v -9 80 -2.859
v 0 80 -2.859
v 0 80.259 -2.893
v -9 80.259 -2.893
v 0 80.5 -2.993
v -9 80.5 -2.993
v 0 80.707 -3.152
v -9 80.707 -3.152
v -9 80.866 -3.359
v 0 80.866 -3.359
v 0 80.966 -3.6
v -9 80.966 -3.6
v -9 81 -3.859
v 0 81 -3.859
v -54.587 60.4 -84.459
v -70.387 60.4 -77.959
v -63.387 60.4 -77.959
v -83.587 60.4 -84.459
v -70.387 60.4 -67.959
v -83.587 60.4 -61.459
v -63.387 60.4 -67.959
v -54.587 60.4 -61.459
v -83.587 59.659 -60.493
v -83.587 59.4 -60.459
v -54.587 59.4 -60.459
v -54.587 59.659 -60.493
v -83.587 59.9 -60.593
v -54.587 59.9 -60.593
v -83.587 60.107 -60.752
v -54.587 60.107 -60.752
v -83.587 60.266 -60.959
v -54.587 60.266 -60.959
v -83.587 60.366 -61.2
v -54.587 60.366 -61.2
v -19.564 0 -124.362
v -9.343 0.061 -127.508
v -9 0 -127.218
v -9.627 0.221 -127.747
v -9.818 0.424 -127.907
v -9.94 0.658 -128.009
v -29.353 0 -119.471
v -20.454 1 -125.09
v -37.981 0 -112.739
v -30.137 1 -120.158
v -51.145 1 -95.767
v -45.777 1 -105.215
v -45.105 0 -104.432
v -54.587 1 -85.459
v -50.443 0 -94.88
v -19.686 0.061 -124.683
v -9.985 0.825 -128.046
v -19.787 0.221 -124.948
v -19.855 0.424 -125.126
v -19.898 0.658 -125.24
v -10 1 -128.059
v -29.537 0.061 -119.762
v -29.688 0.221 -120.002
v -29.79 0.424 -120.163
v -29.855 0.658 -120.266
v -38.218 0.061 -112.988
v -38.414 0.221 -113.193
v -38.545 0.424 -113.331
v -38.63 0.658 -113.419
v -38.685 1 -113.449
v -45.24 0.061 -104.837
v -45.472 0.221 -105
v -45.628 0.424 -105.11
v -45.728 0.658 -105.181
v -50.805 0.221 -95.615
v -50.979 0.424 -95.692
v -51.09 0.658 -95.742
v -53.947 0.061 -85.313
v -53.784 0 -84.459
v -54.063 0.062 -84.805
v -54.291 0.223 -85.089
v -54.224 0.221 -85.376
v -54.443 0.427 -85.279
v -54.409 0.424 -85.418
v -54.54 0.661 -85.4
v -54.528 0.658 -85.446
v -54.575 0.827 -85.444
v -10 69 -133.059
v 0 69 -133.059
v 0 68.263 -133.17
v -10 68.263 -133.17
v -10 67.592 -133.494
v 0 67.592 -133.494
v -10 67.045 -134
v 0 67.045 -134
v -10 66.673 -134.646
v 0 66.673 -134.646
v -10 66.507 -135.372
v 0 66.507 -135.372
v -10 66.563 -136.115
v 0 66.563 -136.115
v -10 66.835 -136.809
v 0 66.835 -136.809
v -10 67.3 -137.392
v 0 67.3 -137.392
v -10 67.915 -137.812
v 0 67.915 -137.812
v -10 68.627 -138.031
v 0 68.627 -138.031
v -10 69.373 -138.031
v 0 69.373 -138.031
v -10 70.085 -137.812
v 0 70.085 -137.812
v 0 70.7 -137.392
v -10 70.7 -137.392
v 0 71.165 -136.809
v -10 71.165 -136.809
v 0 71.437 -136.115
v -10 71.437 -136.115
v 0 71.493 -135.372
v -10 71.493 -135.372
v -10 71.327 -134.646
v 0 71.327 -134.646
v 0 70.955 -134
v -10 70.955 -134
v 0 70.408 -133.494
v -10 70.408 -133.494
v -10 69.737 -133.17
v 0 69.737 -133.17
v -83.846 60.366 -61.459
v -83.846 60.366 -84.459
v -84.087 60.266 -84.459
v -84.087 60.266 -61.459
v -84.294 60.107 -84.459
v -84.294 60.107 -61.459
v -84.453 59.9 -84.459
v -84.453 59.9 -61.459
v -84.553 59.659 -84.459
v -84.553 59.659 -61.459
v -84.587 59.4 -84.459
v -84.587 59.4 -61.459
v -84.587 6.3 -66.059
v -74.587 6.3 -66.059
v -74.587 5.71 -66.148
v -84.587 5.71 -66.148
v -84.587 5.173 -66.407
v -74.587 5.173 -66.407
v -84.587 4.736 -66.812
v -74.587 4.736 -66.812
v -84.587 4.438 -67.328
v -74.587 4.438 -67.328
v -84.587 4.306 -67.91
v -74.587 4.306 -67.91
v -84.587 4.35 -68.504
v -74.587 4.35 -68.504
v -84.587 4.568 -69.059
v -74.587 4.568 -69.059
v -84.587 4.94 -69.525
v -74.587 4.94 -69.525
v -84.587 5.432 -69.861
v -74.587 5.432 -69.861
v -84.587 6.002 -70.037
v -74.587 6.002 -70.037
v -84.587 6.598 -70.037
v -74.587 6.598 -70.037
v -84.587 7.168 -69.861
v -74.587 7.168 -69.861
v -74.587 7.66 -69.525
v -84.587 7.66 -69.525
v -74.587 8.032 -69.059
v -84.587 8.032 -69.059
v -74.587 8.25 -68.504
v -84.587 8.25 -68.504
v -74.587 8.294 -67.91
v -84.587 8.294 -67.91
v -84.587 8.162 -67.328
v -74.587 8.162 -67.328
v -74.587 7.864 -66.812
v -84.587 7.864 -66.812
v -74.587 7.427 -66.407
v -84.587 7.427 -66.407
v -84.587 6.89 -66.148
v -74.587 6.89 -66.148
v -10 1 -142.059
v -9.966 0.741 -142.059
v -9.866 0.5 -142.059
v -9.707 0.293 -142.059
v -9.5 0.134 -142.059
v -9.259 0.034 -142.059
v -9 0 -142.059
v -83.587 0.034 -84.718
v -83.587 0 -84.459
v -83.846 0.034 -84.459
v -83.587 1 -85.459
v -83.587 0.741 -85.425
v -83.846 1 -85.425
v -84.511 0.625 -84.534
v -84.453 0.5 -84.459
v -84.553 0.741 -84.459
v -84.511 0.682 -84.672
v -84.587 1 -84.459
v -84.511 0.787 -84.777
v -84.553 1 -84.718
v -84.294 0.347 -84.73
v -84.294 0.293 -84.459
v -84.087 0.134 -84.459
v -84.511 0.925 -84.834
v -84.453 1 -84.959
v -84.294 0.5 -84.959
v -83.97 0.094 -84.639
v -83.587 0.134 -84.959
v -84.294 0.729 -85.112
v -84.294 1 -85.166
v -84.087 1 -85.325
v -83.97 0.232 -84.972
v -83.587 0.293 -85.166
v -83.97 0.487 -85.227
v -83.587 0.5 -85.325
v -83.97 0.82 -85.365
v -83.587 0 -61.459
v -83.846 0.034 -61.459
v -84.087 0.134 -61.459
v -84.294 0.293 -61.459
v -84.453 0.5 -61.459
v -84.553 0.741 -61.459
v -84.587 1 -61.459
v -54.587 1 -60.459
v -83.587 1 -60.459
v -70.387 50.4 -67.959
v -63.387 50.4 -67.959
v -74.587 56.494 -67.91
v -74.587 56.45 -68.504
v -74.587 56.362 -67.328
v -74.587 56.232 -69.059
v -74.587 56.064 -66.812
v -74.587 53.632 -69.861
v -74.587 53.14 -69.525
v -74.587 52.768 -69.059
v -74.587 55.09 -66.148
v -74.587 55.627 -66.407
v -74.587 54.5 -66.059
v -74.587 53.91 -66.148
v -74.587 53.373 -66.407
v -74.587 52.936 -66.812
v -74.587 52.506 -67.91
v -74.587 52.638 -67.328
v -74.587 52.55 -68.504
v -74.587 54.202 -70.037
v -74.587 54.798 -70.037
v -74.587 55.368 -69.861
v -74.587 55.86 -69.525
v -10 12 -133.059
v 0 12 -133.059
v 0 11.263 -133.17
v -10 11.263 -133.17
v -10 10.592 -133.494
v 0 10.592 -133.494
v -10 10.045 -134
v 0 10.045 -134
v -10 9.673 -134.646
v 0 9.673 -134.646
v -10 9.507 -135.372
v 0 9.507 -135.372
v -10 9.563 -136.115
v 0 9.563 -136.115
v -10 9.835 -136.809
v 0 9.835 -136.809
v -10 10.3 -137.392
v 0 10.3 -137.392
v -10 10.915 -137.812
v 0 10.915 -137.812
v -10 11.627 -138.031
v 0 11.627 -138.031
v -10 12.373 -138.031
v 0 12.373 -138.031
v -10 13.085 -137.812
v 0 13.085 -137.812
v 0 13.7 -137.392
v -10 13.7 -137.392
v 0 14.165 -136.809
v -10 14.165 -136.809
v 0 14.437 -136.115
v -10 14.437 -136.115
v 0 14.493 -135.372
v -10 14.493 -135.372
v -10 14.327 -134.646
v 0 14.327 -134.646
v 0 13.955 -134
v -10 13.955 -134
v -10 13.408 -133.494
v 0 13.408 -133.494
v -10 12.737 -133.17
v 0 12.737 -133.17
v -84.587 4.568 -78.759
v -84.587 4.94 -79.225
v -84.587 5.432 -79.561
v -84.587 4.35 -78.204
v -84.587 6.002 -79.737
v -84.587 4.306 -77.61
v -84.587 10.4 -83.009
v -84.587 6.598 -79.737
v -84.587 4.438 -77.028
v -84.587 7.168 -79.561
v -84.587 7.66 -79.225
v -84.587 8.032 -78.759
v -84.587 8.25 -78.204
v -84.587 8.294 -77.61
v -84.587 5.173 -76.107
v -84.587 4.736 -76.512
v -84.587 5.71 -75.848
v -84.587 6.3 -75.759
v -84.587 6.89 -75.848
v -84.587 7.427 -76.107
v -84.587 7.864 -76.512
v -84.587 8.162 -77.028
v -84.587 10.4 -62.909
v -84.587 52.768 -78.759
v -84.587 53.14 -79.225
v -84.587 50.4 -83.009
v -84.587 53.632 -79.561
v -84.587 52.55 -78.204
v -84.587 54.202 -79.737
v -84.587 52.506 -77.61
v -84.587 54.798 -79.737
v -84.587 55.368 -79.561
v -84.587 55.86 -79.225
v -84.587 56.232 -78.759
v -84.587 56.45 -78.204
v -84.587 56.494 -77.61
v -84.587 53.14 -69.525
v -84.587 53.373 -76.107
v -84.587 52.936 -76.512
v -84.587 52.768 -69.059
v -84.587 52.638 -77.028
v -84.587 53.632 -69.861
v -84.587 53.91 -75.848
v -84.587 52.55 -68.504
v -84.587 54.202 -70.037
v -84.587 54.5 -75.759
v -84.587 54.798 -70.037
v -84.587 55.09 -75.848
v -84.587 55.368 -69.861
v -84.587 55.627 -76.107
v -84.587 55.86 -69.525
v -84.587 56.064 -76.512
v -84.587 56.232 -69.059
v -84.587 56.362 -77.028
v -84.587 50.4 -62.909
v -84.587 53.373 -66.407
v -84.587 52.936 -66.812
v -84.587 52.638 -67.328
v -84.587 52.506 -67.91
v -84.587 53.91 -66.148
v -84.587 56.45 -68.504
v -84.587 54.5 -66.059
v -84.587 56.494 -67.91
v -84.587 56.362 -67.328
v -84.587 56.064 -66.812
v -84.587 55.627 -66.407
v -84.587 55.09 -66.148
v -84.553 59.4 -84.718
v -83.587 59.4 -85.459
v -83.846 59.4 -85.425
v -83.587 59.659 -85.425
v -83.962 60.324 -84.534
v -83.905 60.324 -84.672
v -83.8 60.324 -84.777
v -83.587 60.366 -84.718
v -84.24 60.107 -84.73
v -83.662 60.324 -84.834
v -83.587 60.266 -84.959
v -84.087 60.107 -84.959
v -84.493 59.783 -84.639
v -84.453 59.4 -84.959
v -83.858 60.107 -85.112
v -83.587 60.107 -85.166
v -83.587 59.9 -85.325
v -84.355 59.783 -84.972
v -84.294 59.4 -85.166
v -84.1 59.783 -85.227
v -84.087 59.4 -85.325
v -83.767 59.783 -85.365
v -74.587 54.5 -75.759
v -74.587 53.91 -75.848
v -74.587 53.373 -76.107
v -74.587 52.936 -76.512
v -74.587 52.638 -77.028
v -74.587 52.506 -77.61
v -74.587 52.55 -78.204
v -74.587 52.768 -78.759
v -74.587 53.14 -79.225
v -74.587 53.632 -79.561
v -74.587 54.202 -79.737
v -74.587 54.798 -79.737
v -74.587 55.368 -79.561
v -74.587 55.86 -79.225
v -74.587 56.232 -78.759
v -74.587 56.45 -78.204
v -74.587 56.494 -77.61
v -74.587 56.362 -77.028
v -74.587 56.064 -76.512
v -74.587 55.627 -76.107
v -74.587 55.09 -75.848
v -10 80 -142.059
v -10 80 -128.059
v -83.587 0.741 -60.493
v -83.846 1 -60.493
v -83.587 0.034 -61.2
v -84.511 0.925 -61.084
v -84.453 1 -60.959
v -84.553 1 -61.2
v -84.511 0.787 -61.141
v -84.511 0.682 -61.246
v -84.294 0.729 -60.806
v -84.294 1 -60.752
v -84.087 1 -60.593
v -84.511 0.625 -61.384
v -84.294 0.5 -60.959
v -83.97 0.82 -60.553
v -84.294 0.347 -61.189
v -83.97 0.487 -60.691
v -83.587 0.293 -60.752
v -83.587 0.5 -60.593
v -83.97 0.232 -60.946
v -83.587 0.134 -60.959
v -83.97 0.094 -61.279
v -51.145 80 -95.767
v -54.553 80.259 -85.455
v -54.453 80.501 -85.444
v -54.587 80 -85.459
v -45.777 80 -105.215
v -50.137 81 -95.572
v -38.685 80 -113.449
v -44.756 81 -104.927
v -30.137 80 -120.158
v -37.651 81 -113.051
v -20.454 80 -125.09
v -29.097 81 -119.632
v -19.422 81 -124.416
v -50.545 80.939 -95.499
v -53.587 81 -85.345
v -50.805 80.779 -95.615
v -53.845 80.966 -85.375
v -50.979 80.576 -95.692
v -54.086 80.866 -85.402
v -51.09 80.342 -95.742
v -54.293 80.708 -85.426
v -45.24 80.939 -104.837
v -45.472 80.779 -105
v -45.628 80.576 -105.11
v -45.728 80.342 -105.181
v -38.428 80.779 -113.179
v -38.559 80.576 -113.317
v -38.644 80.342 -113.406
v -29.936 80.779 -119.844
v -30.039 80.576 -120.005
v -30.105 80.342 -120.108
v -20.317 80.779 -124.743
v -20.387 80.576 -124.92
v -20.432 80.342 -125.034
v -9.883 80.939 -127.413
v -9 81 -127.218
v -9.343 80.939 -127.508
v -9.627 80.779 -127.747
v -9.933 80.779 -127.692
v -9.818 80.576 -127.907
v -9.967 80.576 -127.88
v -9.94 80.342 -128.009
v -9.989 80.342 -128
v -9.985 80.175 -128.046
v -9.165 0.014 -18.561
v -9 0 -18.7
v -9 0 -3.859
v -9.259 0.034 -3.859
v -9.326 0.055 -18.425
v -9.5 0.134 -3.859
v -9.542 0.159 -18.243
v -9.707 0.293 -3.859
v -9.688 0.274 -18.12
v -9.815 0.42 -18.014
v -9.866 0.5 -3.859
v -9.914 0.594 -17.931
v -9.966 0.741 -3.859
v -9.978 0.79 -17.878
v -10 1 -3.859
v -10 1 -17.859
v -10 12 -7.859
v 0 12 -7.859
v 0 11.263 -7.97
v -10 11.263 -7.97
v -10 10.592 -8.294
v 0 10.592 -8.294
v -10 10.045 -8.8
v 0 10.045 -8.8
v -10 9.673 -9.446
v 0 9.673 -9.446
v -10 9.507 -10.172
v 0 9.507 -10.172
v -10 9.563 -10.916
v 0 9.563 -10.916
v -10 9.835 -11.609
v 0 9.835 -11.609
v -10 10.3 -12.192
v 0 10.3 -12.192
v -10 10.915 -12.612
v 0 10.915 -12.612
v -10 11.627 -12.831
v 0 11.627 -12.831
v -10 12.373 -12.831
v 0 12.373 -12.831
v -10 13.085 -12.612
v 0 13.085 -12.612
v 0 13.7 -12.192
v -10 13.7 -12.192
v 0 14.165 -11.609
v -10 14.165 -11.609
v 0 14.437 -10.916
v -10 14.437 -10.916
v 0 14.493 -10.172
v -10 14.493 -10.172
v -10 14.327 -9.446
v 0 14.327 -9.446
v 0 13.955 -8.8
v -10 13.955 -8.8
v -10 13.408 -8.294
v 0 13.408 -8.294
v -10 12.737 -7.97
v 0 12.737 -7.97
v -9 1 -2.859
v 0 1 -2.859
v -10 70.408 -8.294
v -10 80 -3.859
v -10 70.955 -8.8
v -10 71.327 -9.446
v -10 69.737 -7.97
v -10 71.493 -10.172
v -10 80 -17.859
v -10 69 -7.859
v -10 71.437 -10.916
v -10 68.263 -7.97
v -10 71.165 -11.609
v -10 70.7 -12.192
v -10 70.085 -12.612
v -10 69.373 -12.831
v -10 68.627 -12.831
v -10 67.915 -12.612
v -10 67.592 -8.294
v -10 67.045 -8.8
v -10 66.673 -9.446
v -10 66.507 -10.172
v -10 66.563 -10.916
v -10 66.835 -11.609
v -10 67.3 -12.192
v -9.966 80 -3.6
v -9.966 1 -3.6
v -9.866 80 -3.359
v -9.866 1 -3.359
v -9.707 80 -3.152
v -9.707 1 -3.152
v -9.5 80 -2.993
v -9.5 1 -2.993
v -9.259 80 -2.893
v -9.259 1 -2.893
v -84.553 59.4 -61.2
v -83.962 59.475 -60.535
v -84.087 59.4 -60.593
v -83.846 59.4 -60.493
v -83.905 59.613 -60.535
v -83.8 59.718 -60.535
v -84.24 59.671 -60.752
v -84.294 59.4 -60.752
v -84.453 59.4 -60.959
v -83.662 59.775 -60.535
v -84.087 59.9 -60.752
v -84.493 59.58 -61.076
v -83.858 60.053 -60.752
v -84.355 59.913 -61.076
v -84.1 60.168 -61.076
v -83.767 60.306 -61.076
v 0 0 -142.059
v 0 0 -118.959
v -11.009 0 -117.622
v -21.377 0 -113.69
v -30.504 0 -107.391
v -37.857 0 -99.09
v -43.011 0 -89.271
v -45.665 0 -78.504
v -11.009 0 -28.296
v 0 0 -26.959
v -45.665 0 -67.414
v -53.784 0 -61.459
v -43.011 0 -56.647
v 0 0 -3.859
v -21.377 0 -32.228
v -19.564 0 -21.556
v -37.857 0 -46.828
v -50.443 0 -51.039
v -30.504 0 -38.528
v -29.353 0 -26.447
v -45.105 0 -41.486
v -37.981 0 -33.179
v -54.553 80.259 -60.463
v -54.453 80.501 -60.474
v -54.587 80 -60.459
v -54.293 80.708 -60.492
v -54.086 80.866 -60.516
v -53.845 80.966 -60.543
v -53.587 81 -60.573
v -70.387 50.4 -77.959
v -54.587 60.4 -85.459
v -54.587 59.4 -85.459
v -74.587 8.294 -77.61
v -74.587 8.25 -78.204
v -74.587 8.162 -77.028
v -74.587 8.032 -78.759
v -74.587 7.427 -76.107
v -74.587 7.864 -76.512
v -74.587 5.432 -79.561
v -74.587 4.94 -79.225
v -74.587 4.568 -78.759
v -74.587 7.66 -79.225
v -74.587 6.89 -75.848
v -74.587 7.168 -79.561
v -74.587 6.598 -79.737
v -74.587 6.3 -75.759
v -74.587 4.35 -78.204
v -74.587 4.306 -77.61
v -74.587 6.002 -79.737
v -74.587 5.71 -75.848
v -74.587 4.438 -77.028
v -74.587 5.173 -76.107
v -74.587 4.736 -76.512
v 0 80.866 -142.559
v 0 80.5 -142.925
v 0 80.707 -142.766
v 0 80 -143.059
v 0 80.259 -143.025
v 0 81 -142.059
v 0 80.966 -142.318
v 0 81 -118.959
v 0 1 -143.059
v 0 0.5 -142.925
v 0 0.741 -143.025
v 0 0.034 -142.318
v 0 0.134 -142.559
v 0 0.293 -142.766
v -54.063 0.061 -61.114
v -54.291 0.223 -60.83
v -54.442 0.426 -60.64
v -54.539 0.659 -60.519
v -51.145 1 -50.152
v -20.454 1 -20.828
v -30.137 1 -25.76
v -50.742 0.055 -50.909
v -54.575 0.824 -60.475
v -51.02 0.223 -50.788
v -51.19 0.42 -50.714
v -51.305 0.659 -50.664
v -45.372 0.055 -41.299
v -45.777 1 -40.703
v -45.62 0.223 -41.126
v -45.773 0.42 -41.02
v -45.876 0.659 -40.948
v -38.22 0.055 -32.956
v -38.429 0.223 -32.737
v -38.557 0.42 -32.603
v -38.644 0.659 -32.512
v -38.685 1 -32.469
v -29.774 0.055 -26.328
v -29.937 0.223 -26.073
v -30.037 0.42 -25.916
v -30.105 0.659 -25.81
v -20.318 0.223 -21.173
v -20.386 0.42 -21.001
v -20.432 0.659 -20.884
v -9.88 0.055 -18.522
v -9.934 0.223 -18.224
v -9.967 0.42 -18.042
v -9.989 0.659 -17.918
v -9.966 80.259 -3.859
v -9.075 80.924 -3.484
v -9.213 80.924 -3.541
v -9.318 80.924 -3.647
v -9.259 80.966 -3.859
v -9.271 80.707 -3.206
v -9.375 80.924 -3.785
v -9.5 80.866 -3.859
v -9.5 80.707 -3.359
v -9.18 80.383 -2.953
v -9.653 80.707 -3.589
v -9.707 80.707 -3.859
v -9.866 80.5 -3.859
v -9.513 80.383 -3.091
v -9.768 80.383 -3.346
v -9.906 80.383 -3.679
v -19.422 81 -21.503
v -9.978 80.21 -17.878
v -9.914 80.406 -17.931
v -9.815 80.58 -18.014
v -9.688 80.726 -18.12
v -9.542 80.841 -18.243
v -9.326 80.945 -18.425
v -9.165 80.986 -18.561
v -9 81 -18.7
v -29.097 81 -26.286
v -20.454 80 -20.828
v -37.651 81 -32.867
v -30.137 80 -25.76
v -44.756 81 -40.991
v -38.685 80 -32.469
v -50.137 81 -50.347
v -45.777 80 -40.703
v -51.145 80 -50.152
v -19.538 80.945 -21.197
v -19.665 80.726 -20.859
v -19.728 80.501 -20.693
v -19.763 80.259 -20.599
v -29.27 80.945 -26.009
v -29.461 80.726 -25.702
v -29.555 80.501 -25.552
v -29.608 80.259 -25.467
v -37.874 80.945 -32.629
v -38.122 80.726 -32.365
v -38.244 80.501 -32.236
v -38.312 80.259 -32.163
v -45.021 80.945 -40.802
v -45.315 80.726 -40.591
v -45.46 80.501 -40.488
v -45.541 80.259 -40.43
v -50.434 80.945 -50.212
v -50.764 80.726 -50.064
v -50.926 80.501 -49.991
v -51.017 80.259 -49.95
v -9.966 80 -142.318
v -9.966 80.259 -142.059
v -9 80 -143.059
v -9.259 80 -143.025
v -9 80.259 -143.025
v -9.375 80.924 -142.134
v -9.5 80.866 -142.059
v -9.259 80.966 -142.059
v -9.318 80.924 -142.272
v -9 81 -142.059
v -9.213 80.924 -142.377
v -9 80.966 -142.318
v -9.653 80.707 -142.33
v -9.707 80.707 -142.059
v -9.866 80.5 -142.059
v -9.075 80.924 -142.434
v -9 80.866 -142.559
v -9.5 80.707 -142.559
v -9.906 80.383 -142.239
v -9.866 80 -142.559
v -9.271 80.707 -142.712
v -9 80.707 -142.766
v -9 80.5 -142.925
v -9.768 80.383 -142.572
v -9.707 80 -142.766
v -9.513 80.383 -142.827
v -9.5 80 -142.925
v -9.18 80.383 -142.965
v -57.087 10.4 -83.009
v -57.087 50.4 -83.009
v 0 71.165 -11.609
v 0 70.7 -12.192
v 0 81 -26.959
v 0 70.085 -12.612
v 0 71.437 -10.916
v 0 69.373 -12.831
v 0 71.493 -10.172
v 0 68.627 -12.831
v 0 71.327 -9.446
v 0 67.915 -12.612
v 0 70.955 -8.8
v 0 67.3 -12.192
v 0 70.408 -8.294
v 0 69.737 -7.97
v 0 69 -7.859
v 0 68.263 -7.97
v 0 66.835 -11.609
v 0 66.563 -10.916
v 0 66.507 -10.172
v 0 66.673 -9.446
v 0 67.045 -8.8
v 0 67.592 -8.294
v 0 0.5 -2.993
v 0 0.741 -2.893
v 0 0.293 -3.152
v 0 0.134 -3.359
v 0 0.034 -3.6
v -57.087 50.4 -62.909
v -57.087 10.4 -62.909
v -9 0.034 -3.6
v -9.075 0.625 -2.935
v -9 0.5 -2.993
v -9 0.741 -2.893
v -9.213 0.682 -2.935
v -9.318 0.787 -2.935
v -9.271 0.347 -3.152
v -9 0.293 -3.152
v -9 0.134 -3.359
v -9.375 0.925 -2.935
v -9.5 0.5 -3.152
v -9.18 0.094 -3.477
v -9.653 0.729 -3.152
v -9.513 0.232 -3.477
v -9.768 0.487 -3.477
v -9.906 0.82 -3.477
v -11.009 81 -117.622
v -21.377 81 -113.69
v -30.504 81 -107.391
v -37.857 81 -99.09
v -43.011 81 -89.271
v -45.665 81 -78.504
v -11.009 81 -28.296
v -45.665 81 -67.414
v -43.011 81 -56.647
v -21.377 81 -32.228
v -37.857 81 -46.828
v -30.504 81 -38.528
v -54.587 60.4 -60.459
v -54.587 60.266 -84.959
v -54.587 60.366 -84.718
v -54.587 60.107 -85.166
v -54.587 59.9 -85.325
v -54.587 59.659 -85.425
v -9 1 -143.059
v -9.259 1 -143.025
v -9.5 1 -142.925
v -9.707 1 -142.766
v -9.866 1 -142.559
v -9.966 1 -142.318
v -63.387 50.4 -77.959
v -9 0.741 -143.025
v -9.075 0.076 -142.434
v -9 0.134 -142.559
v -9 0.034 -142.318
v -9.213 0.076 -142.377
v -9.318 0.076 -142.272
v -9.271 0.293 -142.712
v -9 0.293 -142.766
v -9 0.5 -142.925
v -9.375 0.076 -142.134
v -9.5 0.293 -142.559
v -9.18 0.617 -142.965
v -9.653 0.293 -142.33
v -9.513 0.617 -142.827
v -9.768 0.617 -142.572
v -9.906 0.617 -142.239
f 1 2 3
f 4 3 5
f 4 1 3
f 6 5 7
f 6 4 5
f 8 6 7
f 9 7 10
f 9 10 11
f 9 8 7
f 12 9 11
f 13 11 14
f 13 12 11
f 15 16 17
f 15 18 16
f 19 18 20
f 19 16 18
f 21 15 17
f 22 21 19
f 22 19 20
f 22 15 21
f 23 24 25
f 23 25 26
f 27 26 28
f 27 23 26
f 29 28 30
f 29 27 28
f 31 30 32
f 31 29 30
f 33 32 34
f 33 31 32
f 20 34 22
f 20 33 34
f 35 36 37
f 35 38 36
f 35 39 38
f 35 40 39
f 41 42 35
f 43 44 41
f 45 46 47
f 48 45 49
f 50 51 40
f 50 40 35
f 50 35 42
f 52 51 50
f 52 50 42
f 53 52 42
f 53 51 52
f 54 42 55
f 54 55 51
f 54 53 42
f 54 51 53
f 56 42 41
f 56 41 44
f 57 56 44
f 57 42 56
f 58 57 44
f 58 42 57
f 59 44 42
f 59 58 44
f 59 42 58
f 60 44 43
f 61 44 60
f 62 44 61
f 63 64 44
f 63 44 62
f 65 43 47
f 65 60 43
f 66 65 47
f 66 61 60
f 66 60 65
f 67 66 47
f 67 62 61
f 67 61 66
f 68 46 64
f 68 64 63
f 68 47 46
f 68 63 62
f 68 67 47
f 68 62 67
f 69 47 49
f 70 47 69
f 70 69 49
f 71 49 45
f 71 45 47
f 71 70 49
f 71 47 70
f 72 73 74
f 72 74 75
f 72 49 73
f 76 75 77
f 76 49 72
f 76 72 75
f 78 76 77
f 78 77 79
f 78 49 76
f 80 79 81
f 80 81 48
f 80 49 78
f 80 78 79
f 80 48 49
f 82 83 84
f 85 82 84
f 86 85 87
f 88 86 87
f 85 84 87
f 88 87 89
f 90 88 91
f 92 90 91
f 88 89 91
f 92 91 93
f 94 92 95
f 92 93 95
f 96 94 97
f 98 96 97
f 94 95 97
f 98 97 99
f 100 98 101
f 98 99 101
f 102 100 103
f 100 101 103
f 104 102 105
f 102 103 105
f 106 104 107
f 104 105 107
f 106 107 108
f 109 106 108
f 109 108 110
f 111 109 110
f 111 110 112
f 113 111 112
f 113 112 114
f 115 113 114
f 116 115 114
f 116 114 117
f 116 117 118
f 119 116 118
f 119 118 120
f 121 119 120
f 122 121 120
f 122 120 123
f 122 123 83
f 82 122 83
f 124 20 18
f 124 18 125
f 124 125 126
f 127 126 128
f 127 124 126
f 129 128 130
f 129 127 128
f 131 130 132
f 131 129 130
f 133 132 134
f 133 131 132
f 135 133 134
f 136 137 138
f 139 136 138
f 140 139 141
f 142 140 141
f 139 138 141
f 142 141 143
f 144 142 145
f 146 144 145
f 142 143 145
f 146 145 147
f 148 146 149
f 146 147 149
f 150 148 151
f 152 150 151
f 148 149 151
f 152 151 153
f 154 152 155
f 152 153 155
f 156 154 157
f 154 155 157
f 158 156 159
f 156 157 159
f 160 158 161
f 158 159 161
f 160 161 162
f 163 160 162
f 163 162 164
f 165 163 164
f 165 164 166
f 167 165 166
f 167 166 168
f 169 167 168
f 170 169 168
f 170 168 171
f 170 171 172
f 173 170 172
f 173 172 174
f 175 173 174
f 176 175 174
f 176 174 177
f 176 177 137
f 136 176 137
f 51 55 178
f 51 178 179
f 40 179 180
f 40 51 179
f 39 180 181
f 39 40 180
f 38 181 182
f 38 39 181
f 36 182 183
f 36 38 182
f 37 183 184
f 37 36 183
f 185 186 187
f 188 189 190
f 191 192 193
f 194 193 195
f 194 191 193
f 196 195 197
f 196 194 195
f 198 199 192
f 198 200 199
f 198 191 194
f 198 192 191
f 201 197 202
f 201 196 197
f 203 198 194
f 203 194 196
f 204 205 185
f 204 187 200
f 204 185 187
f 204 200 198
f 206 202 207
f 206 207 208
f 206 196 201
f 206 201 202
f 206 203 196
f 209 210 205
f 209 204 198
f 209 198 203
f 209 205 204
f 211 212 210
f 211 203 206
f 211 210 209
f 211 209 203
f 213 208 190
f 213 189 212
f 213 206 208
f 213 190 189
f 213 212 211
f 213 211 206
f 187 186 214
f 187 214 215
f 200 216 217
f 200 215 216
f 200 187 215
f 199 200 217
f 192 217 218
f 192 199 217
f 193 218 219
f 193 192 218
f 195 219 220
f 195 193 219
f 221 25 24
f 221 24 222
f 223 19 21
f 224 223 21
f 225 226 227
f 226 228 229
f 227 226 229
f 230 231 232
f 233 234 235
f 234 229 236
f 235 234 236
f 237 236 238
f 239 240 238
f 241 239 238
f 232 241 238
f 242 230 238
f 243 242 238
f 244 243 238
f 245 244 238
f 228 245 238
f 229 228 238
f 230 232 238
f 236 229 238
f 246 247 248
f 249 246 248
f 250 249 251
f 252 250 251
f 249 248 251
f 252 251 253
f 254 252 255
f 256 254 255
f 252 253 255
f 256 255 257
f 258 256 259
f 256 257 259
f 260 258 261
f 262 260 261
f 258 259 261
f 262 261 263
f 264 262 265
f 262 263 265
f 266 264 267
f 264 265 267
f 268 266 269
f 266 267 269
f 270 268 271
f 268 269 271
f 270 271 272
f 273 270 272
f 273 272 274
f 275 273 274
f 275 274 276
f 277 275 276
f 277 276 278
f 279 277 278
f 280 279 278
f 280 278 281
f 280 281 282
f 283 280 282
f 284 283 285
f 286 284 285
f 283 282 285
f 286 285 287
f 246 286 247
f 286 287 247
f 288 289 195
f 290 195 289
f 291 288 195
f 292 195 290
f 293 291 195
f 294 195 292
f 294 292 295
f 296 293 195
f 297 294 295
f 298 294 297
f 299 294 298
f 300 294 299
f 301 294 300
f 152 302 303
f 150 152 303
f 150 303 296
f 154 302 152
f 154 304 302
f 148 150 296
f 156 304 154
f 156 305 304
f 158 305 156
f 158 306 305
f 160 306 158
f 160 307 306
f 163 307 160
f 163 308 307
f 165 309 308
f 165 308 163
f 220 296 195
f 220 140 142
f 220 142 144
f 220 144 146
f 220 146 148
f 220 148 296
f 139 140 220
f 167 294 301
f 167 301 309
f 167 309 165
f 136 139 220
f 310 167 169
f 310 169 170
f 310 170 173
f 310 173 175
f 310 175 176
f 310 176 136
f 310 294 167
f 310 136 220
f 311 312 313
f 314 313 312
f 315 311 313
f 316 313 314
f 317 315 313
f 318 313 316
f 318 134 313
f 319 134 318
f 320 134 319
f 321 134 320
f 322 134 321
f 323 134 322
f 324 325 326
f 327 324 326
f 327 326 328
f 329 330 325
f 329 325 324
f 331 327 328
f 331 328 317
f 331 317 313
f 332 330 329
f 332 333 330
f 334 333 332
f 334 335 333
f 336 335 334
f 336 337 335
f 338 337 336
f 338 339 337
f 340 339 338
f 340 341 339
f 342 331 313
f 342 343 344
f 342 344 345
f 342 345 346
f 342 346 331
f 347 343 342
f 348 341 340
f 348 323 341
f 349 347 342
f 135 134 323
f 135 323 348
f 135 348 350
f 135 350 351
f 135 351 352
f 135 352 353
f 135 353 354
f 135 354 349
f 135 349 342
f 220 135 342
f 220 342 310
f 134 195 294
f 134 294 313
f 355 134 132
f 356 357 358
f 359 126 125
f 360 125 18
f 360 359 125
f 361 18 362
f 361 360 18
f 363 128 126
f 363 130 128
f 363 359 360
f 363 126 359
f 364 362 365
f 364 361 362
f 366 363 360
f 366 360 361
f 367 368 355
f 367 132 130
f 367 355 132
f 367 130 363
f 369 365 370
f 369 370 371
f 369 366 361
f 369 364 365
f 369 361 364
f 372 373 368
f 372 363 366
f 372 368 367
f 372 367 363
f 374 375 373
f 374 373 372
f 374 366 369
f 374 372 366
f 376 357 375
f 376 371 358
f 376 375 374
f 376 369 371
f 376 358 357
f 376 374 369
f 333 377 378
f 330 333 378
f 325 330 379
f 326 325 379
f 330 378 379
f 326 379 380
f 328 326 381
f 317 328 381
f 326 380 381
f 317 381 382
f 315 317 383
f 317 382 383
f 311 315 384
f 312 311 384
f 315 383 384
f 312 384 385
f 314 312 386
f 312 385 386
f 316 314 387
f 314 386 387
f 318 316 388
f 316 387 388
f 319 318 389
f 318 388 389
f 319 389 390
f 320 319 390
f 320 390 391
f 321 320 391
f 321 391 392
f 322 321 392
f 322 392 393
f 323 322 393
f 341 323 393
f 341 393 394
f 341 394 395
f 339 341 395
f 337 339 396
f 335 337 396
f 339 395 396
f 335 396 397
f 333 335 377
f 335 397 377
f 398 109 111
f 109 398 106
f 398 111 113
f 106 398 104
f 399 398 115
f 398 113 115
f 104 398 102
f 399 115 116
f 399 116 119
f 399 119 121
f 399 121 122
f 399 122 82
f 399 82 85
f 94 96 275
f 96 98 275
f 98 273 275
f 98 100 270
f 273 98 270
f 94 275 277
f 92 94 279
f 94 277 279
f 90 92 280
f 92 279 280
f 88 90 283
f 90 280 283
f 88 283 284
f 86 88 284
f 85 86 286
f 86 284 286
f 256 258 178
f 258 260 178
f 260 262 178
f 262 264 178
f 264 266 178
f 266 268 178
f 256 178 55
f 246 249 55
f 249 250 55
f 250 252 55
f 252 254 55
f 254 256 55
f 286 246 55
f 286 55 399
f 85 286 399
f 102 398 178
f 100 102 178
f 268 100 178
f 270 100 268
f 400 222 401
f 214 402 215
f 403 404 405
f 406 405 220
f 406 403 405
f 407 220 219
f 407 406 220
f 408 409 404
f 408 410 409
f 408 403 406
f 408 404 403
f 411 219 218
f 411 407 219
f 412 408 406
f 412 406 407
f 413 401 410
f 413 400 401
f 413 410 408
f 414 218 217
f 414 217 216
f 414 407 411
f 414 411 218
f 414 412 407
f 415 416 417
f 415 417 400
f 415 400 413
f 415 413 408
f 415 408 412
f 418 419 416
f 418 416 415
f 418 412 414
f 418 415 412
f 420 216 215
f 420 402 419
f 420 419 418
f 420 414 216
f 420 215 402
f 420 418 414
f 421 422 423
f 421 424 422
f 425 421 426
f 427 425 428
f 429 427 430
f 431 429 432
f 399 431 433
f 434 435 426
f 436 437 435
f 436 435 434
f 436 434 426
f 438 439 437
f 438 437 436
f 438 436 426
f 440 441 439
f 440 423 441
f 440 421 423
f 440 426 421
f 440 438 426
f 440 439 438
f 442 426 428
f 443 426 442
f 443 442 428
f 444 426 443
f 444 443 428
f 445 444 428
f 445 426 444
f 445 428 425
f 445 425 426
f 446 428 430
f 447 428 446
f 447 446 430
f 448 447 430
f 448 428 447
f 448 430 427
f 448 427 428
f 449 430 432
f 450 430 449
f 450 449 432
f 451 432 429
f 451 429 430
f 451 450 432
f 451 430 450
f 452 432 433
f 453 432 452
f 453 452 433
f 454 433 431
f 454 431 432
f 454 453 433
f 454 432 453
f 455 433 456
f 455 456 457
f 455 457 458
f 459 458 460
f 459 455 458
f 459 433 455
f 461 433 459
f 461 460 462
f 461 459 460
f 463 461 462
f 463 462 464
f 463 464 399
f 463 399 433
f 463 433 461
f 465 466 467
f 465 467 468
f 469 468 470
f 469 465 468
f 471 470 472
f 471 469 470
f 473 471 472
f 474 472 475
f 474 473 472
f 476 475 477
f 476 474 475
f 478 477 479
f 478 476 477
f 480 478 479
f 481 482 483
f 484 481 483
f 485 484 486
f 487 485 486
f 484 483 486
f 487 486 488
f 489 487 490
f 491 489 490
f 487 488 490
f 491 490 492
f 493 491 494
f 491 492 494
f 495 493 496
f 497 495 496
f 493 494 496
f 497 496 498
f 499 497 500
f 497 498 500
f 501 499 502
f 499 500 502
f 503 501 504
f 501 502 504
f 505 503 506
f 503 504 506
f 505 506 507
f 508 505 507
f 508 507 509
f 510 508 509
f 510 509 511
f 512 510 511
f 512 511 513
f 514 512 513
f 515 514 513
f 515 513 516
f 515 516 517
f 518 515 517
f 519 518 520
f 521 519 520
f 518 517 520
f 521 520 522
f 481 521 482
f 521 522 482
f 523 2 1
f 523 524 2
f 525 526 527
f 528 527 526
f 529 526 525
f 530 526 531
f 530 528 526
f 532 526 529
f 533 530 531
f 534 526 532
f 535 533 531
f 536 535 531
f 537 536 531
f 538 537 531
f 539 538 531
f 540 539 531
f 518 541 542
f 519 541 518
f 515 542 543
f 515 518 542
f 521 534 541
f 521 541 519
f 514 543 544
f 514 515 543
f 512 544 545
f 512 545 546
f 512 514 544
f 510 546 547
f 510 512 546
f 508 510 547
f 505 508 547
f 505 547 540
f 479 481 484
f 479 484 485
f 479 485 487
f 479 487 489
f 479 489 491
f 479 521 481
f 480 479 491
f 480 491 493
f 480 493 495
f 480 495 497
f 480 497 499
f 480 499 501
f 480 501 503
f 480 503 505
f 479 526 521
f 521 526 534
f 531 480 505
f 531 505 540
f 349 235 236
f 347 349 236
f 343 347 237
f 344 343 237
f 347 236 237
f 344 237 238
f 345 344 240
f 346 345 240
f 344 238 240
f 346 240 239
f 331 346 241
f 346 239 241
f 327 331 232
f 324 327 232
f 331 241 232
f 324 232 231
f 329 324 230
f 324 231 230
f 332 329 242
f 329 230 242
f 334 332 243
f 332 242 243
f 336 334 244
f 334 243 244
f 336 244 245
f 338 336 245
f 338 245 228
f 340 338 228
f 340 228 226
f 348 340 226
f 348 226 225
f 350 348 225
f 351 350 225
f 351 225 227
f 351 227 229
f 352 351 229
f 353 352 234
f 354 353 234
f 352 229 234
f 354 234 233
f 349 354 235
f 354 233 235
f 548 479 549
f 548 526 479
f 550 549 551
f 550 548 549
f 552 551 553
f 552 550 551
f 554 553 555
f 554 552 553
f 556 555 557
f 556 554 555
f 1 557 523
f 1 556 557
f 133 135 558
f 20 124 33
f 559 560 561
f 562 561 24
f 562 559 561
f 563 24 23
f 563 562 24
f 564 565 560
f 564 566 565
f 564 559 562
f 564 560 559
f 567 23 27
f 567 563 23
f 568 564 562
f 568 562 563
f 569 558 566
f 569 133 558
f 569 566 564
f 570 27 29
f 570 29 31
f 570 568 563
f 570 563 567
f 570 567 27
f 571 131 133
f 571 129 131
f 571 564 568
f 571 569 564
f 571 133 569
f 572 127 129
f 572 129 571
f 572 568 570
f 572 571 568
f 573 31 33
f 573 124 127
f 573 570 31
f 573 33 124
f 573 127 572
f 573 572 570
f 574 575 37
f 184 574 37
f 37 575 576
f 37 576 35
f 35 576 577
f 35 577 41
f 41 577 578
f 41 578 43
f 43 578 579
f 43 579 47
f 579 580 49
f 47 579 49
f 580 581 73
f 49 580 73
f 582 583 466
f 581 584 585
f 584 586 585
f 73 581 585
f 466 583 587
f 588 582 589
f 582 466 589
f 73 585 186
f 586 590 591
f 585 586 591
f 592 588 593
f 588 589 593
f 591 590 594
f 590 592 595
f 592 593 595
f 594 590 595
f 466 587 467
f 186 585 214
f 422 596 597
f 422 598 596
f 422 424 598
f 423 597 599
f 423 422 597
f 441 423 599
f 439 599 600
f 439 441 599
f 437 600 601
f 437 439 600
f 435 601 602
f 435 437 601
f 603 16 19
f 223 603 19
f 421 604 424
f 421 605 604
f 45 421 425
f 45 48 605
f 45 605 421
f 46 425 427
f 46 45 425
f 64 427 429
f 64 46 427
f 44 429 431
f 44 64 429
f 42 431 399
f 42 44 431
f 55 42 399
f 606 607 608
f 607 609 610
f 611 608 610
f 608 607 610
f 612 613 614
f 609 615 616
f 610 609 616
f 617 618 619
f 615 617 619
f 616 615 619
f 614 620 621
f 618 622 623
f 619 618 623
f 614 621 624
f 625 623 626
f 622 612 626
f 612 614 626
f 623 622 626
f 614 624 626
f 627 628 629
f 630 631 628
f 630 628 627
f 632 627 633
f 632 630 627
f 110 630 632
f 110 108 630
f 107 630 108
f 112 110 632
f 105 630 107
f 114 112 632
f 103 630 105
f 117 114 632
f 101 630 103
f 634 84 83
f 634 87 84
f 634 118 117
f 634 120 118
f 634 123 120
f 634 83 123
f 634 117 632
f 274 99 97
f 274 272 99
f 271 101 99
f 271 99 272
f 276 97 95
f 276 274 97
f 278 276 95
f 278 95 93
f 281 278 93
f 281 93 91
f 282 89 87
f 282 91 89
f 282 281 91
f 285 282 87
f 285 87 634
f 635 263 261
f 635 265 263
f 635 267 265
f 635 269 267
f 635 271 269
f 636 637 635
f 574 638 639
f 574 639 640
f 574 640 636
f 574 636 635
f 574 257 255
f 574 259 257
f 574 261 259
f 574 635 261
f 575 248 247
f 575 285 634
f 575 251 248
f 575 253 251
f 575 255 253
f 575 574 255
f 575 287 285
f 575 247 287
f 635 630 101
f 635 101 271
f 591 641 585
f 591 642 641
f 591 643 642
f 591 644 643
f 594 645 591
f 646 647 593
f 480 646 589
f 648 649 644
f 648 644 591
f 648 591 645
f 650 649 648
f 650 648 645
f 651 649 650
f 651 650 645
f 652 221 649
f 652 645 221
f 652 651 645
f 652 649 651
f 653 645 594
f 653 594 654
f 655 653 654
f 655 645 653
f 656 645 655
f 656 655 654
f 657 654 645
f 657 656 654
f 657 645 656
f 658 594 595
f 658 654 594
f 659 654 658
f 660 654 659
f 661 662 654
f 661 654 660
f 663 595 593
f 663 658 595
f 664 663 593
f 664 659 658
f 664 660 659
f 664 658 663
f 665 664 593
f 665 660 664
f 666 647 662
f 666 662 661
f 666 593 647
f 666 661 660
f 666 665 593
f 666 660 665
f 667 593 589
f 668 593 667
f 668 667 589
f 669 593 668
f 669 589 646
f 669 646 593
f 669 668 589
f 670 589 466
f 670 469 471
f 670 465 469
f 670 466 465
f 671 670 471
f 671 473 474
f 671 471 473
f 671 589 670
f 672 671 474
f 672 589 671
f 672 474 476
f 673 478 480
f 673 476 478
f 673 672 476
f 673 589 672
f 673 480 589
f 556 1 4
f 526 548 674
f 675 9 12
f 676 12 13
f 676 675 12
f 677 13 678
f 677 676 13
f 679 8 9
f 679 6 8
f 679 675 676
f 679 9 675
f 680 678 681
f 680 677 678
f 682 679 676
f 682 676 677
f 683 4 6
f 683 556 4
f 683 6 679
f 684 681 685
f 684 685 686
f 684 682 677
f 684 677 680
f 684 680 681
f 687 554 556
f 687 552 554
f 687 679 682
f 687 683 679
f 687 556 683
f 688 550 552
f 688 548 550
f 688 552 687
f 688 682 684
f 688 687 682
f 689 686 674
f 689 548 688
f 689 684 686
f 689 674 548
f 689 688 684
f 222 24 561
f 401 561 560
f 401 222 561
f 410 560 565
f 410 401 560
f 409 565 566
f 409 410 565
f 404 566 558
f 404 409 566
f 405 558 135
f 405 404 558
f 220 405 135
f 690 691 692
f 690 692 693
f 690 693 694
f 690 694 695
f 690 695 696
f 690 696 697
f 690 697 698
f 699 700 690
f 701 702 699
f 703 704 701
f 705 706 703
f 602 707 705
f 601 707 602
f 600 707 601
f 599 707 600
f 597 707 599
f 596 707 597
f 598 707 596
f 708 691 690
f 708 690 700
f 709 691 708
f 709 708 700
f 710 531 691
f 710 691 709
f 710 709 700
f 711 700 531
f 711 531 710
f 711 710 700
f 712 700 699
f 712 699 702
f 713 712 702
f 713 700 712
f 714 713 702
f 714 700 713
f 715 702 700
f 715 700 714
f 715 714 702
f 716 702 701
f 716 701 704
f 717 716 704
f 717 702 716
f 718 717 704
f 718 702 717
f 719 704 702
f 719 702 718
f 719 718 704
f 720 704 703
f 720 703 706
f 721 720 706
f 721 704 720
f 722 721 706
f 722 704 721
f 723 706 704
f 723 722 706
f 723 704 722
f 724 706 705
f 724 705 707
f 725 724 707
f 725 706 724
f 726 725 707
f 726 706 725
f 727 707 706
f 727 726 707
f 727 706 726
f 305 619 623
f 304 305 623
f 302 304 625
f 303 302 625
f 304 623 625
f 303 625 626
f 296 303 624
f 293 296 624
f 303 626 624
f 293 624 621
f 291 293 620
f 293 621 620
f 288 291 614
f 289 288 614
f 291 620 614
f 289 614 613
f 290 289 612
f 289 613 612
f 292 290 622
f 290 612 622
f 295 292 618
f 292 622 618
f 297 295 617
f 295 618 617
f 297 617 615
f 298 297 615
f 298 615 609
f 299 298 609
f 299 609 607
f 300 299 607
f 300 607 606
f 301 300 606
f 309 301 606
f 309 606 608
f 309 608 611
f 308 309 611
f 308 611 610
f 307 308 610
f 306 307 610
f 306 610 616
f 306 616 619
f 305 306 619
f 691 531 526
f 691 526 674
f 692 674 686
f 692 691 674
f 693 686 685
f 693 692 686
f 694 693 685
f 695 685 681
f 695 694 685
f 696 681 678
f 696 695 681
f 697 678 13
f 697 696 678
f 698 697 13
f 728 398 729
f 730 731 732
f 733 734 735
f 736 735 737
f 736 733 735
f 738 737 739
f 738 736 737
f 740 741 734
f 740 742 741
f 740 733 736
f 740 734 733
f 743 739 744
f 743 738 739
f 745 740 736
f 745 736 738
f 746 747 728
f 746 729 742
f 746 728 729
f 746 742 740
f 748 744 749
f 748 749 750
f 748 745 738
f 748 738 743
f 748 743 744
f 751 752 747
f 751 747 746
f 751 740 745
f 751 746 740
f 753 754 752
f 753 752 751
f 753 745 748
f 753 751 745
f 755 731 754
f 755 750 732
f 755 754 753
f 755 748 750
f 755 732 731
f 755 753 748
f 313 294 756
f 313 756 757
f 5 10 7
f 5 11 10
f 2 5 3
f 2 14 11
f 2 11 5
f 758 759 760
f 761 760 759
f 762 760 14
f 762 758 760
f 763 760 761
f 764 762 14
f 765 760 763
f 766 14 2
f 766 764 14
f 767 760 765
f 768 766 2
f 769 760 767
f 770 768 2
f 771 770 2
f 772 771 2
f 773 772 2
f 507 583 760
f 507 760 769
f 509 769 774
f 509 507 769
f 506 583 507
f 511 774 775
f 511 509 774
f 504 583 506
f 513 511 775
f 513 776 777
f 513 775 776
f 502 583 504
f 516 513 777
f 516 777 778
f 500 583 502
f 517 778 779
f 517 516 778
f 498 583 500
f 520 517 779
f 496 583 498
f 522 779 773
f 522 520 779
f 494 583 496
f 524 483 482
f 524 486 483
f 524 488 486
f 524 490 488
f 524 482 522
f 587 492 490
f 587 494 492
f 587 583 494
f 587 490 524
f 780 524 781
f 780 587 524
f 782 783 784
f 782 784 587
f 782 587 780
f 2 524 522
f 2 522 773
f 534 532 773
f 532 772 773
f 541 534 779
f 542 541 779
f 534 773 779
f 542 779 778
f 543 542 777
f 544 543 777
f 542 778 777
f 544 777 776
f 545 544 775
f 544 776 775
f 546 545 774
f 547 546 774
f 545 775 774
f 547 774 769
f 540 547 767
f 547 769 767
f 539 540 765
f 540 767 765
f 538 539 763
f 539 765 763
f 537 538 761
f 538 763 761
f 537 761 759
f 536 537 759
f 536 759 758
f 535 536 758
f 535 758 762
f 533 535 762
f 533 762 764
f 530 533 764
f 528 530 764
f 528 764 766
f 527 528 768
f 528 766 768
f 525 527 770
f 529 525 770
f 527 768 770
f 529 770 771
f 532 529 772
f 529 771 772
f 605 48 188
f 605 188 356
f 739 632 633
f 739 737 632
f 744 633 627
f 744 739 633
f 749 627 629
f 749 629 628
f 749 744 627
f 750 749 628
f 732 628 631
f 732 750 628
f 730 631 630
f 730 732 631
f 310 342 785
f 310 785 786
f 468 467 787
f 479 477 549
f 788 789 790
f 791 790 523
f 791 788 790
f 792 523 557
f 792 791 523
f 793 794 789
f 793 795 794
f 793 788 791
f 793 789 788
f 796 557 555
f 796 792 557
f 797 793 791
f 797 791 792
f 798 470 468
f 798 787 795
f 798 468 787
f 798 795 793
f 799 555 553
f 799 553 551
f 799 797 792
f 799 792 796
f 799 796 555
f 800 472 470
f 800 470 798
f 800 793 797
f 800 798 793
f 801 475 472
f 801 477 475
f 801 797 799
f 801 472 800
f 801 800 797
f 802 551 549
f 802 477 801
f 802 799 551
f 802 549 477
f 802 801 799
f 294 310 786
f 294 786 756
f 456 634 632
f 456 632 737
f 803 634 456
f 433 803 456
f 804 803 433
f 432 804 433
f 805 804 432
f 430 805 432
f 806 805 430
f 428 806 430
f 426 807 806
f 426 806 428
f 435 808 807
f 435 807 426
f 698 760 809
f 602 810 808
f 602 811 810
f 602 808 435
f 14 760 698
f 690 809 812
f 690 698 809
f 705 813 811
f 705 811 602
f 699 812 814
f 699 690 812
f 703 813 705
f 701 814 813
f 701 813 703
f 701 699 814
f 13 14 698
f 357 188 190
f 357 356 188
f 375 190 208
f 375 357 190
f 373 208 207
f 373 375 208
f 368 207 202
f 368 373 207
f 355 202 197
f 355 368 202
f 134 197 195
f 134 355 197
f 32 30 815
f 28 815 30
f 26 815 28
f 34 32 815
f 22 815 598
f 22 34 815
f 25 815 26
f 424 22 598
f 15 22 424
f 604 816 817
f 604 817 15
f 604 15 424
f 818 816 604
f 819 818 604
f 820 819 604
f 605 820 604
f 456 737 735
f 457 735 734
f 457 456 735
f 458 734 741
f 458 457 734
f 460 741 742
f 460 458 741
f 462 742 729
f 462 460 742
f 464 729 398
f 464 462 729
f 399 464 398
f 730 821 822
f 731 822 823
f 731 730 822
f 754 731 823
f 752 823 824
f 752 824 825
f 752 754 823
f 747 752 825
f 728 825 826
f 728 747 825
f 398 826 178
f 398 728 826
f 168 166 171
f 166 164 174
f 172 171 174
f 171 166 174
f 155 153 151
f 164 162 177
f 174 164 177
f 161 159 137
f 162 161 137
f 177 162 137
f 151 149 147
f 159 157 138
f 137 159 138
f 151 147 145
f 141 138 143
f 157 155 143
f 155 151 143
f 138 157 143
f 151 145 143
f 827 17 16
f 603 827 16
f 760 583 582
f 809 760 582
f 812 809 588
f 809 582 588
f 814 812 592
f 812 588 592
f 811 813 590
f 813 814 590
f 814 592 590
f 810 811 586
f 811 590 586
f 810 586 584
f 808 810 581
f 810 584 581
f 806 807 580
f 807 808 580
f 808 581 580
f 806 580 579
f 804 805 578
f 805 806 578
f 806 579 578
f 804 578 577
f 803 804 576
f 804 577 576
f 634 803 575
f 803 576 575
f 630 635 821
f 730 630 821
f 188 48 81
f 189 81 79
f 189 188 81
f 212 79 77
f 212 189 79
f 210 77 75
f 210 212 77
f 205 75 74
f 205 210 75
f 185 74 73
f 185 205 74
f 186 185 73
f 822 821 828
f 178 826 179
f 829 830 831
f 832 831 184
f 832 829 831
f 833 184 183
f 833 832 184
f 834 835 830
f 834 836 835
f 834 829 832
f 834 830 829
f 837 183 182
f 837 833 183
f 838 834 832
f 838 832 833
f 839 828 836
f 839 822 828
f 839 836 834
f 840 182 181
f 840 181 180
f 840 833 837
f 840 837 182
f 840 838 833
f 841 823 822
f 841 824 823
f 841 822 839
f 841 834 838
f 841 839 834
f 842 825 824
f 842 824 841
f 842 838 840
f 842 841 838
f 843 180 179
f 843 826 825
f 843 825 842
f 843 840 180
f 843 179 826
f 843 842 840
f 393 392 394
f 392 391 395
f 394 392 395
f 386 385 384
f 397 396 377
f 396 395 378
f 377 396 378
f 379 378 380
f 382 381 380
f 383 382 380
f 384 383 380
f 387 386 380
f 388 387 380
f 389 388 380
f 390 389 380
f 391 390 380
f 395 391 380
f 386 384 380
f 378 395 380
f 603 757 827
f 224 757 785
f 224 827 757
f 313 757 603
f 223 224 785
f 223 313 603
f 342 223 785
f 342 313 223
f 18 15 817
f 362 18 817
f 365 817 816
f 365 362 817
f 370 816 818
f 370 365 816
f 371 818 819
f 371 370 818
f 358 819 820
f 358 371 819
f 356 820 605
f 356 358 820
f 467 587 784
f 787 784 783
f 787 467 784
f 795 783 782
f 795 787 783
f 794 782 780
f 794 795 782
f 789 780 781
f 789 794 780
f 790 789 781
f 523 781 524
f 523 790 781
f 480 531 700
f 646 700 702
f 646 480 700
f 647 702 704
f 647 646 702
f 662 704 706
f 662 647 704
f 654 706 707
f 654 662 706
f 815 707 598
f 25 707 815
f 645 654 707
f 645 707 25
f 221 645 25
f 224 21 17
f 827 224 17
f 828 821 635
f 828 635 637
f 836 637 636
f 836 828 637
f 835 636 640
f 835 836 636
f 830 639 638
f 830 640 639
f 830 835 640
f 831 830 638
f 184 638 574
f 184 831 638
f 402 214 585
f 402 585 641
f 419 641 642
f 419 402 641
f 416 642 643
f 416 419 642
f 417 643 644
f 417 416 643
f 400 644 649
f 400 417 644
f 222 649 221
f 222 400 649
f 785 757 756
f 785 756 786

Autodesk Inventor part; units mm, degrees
ref_plane "YZ Plane" through (0, 0, 0) normal (1, 0, 0) x (0, 1, 0)
ref_plane "XZ Plane" through (0, 0, 0) normal (0, 1, 0) x (-1, 0, 0)
ref_plane "XY Plane" through (0, 0, 0) normal (0, 0, 1) x (1, 0, 0)
sketch "スケッチ1" plane through (0, 0, 0) normal (0, 1, 0) x (-1, 0, 0)
  line L0 (0, 0) -> (70, 0)
  line L1 (70, 0) -> (70, -170)
  line L2 (70, -170) -> (0, -170)
  line L3 (0, -170) -> (0, 0)
  arc A0 (0, -118.9591) -> (0, -26.9591) centre (0, -72.9591) ccw
  arc A1 (0, -128.9591) -> (0, -16.9591) centre (0, -72.9591) ccw
  line L4 (10, -17.8592) -> (0, -17.8592)
  line L5 (0, -17.8592) -> (0, -2.8592)
  line L6 (0, -2.8592) -> (10, -2.8592)
  line L7 (10, -2.8592) -> (10, -17.8592)
  line L8 (10, -128.0591) -> (0, -128.0591)
  line L9 (0, -128.0591) -> (0, -143.0591)
  line L10 (0, -143.0591) -> (10, -143.0591)
  line L11 (10, -143.0591) -> (10, -128.0591)
  line L12 (54.5871, -60.4591) -> (54.5871, -85.4591)
  point P0 (54.5871, -72.9591)
  point P1 (46, -72.9591)
  dimension "d8" = 70
  dimension "d9" = 170
  dimension "d10" = 46
  dimension "d11" = 56
  dimension "d12" = 10
  dimension "d13" = 10
  dimension "d14" = 15
  dimension "d15" = 15
  dimension "d17" = 25
extrude "押し出し1" add sketch "スケッチ1" along normal blind 81 contours L6 L7 A1 L3 | A1 L4 L3 | L4 A1 L12 L8 L3 A0 | L3 A1 L11 L10 | L3 L8 A1
ref_plane "作業平面1" through (-54.5871, 0, -85.4591) normal (-1, 0, 0) x (0, 0, 1)
sketch "スケッチ2" plane through (-54.5871, 0, -85.4591) normal (-1, 0, 0) x (0, 0, 1)
  line L0 (-33.5, 81) -> (58.5, 81) projected
  line L1 (0, 60.4) -> (25, 60.4)
  line L2 (25, 60.4) -> (25, 0)
  line L3 (25, 0) -> (0, 0)
  line L4 (0, 0) -> (0, 60.4)
  line L5 (0, 81) -> (25, 81) projected
  line L6 (0, 0) -> (0, 81) projected
  line L7 (0, 0) -> (25, 0) projected
  line L8 (-57.5999, 0) -> (-57.5999, 81) projected
  line L9 (82.5999, 0) -> (82.5999, 81) projected
  line L10 (-57.5999, 81) -> (82.5999, 0)
  line L11 (-57.5999, 0) -> (-42.5999, 0) projected
  line L12 (-57.5999, 0) -> (82.5999, 81)
  line L13 (12.5, 40.5) -> (12.5, 0) construction
  point P0 (85.4591, 0)
  point P1 (12.5, 81)
  point P2 (12.5, 81)
  point P3 (0, 40.5)
  dimension "d21" = 25
  dimension "d22" = 60.4
  dimension "d50" = 20.6
  dimension "d92" = 40.5
  dimension "d93" = 40.5
  dimension "d96" = 12.5
extrude "押し出し2" add sketch "スケッチ2" along normal blind 30 contours L1 L2 L12 L10 L4 | L10 L12 L4 | L2 L10 L12 | L12 L10 L2 L3 L4
ref_plane "作業平面3" through (-84.5871, 0, -85.4591) normal (-1, 0, 0) x (0, 0, 1)
sketch "スケッチ4" plane through (-84.5871, 0, -85.4591) normal (-1, 0, 0) x (0, 0, 1)
  line L0 (2.45, 50.4) -> (22.55, 50.4)
  line L1 (22.55, 50.4) -> (22.55, 10.4)
  line L2 (22.55, 10.4) -> (2.45, 10.4)
  line L3 (2.45, 10.4) -> (2.45, 50.4)
  line L4 (0, 60.4) -> (25, 60.4) projected
  line L5 (0, 0) -> (0, 60.4) projected
  line L6 (0, 60.4) -> (0, 0) projected
  line L7 (0, 0) -> (25, 0) projected
  line L8 (7.6, 54.5) -> (17.3, 54.5)
  line L9 (7.7, 6.3) -> (17.4, 6.3)
  line L10 (25, 60.4) -> (0, 60.4) projected
  line L11 (0, 81) -> (25, 81) projected
  line L12 (25, 0) -> (25, 60.4) projected
  point P0 (85.4591, 0)
  point P1 (12.5, 50.4)
  point P2 (12.5, 60.4)
  point P3 (2.45, 30.4)
  point P4 (0, 30.2)
  point P5 (0, 0.35)
  point P6 (25, 60)
  point P7 (12.55, 6.3)
  point P8 (12.45, 54.5)
  point P9 (12.5, 60.4)
  point P10 (12.5, 10.4)
  point P11 (12.55, 40.5)
  point P12 (12.5, 81)
  dimension "d28" = 20.1
  dimension "d29" = 40
  dimension "d52" = 10.4
  dimension "d53" = 2.45
  dimension "d54" = 4.1
  dimension "d55" = 4.1
  dimension "d56" = 4.1
  dimension "d57" = 4.1
  dimension "d58" = 9.7
  dimension "d59" = 9.7
  dimension "d100" = 40.5
  dimension "d101" = 9.9
  dimension "d102" = 40.5
  dimension "d107" = 2.45
extrude "押し出し3" cut sketch "スケッチ4" against normal blind 27.5 contours L0 L1 L2 L3
ref_plane "作業平面4" through (-10, 0, -143.0591) normal (-1, 0, 0) x (0, 0, 1)
sketch "スケッチ5" plane through (-10, 0, -143.0591) normal (-1, 0, 0) x (0, 0, 1)
  line L0 (0, 81) -> (15, 81) projected
  line L1 (0, 0) -> (15, 0) projected
  line L2 (125.1998, 81) -> (140.1998, 81) projected
  line L3 (125.1998, 0) -> (140.1998, 0) projected
  point P0 (143.0591, 0)
  point P1 (7.5, 69)
  point P2 (7.5, 12)
  point P3 (132.6998, 69)
  point P4 (132.6998, 12)
  point P5 (7.5, 81)
  point P6 (7.5, 0)
  point P7 (132.6998, 81)
  point P8 (132.6998, 0)
  dimension "d35" = 0
  dimension "d36" = 0
  dimension "d37" = 0
  dimension "d38" = 0
  dimension "d39" = 12
  dimension "d40" = 12
  dimension "d41" = 12
  dimension "d42" = 12
hole "穴1" at (-10, 69, -135.5591) at (-10, 12, -135.5591) at (-10, 69, -10.3592) at (-10, 12, -10.3592) direction (1, 0, 0) diameter 5 end through all
sketch "スケッチ6" plane through (-84.5871, 0, -85.4591) normal (-1, 0, 0) x (0, 0, 1)
  line L0 (7.7, 6.3) -> (17.4, 6.3)
  line L1 (7.7, 54.5) -> (17.4, 54.5)
  line L2 (22.55, 10.4) -> (2.45, 10.4) projected
  line L3 (2.45, 50.4) -> (22.55, 50.4) projected
  point P0 (85.4591, 0)
  point P1 (12.55, 6.3)
  point P2 (12.55, 54.5)
  point P3 (12.5, 10.4)
  point P4 (12.5, 50.4)
  dimension "d63" = 9.7
  dimension "d64" = 9.7
  dimension "d65" = 4.1
  dimension "d66" = 4.1
hole "穴2" at (-84.5871, 54.5, -77.7591) at (-84.5871, 54.5, -68.0591) at (-84.5871, 6.3, -77.7591) at (-84.5871, 6.3, -68.0591) direction (1, 0, 0) diameter 4 depth 10
ref_plane "作業平面5" through (-84.5871, 60.4, -85.4591) normal (0, 1, 0) x (1, 0, 0)
sketch "スケッチ8" plane through (-84.5871, 60.4, -85.4591) normal (0, 1, 0) x (1, 0, 0)
  line L0 (14.2, -17.5) -> (21.2, -17.5)
  line L1 (21.2, -17.5) -> (21.2, -7.5)
  line L2 (21.2, -7.5) -> (14.2, -7.5)
  line L3 (14.2, -7.5) -> (14.2, -17.5)
  line L4 (0, -114.071) -> (0, 86.2117) projected
  line L5 (30, 0) -> (30, -25) projected
  point P0 (84.5871, -85.4591)
  point P1 (14.2, -12.5)
  point P2 (30, -12.5)
  dimension "d87" = 7
  dimension "d88" = 10
  dimension "d89" = 14.2
extrude "押し出し5" cut sketch "スケッチ8" against normal blind 12
fillet "フィレット2" radius 1 23 edges at (-10, 40.5, -143.0591) (-10, 81, -135.5591) (-5, 81, -143.0591) (-5, 0, -143.0591) (-10, 0, -135.5591) (-10, 0, -10.3592) (-5, 0, -2.8592) (-69.5871, 0, -85.4591) (-69.5871, 0, -60.4591) (-84.5871, 0, -72.9591) (-84.5871, 30.2, -85.4591) (-69.5871, 60.4, -85.4591) (-84.5871, 60.4, -72.9591) (-84.5871, 30.2, -60.4591) (-69.5871, 60.4, -60.4591) (-38.6854, 0, -32.4692) (-38.6854, 0, -113.4491) (-10, 40.5, -2.8592) (-5, 81, -2.8592) (-10, 81, -10.3592) (-38.6854, 81, -32.4692) (-38.6854, 81, -113.4491) (-54.5871, 81, -72.9591)
sketch "スケッチ9" plane through (-84.5871, 0, -85.4591) normal (-1, 0, 0) x (0, 0, 1)
  line L0 (2.45, 50.4) -> (22.55, 50.4) projected
  line L1 (2.45, 50.4) -> (22.55, 50.4) projected
  line L2 (-57.5999, 80) -> (-57.5999, 1) projected
  line L3 (82.5999, 1) -> (82.5999, 80) projected
  line L4 (0, 59.4) -> (0, 80) projected
  line L5 (25, 59.4) -> (25, 80) projected
  point P0 (85.4591, 0)
  point P1 (12.5, 50.4)
  point P2 (12.5, 50.4)
  point P3 (12.5, 50.4)
  dimension "d103" = 70.0999
  dimension "d104" = 70.0999
  dimension "d105" = 57.5999
  dimension "d106" = 57.5999
properties part number "motor_mount1_3D プリント"
